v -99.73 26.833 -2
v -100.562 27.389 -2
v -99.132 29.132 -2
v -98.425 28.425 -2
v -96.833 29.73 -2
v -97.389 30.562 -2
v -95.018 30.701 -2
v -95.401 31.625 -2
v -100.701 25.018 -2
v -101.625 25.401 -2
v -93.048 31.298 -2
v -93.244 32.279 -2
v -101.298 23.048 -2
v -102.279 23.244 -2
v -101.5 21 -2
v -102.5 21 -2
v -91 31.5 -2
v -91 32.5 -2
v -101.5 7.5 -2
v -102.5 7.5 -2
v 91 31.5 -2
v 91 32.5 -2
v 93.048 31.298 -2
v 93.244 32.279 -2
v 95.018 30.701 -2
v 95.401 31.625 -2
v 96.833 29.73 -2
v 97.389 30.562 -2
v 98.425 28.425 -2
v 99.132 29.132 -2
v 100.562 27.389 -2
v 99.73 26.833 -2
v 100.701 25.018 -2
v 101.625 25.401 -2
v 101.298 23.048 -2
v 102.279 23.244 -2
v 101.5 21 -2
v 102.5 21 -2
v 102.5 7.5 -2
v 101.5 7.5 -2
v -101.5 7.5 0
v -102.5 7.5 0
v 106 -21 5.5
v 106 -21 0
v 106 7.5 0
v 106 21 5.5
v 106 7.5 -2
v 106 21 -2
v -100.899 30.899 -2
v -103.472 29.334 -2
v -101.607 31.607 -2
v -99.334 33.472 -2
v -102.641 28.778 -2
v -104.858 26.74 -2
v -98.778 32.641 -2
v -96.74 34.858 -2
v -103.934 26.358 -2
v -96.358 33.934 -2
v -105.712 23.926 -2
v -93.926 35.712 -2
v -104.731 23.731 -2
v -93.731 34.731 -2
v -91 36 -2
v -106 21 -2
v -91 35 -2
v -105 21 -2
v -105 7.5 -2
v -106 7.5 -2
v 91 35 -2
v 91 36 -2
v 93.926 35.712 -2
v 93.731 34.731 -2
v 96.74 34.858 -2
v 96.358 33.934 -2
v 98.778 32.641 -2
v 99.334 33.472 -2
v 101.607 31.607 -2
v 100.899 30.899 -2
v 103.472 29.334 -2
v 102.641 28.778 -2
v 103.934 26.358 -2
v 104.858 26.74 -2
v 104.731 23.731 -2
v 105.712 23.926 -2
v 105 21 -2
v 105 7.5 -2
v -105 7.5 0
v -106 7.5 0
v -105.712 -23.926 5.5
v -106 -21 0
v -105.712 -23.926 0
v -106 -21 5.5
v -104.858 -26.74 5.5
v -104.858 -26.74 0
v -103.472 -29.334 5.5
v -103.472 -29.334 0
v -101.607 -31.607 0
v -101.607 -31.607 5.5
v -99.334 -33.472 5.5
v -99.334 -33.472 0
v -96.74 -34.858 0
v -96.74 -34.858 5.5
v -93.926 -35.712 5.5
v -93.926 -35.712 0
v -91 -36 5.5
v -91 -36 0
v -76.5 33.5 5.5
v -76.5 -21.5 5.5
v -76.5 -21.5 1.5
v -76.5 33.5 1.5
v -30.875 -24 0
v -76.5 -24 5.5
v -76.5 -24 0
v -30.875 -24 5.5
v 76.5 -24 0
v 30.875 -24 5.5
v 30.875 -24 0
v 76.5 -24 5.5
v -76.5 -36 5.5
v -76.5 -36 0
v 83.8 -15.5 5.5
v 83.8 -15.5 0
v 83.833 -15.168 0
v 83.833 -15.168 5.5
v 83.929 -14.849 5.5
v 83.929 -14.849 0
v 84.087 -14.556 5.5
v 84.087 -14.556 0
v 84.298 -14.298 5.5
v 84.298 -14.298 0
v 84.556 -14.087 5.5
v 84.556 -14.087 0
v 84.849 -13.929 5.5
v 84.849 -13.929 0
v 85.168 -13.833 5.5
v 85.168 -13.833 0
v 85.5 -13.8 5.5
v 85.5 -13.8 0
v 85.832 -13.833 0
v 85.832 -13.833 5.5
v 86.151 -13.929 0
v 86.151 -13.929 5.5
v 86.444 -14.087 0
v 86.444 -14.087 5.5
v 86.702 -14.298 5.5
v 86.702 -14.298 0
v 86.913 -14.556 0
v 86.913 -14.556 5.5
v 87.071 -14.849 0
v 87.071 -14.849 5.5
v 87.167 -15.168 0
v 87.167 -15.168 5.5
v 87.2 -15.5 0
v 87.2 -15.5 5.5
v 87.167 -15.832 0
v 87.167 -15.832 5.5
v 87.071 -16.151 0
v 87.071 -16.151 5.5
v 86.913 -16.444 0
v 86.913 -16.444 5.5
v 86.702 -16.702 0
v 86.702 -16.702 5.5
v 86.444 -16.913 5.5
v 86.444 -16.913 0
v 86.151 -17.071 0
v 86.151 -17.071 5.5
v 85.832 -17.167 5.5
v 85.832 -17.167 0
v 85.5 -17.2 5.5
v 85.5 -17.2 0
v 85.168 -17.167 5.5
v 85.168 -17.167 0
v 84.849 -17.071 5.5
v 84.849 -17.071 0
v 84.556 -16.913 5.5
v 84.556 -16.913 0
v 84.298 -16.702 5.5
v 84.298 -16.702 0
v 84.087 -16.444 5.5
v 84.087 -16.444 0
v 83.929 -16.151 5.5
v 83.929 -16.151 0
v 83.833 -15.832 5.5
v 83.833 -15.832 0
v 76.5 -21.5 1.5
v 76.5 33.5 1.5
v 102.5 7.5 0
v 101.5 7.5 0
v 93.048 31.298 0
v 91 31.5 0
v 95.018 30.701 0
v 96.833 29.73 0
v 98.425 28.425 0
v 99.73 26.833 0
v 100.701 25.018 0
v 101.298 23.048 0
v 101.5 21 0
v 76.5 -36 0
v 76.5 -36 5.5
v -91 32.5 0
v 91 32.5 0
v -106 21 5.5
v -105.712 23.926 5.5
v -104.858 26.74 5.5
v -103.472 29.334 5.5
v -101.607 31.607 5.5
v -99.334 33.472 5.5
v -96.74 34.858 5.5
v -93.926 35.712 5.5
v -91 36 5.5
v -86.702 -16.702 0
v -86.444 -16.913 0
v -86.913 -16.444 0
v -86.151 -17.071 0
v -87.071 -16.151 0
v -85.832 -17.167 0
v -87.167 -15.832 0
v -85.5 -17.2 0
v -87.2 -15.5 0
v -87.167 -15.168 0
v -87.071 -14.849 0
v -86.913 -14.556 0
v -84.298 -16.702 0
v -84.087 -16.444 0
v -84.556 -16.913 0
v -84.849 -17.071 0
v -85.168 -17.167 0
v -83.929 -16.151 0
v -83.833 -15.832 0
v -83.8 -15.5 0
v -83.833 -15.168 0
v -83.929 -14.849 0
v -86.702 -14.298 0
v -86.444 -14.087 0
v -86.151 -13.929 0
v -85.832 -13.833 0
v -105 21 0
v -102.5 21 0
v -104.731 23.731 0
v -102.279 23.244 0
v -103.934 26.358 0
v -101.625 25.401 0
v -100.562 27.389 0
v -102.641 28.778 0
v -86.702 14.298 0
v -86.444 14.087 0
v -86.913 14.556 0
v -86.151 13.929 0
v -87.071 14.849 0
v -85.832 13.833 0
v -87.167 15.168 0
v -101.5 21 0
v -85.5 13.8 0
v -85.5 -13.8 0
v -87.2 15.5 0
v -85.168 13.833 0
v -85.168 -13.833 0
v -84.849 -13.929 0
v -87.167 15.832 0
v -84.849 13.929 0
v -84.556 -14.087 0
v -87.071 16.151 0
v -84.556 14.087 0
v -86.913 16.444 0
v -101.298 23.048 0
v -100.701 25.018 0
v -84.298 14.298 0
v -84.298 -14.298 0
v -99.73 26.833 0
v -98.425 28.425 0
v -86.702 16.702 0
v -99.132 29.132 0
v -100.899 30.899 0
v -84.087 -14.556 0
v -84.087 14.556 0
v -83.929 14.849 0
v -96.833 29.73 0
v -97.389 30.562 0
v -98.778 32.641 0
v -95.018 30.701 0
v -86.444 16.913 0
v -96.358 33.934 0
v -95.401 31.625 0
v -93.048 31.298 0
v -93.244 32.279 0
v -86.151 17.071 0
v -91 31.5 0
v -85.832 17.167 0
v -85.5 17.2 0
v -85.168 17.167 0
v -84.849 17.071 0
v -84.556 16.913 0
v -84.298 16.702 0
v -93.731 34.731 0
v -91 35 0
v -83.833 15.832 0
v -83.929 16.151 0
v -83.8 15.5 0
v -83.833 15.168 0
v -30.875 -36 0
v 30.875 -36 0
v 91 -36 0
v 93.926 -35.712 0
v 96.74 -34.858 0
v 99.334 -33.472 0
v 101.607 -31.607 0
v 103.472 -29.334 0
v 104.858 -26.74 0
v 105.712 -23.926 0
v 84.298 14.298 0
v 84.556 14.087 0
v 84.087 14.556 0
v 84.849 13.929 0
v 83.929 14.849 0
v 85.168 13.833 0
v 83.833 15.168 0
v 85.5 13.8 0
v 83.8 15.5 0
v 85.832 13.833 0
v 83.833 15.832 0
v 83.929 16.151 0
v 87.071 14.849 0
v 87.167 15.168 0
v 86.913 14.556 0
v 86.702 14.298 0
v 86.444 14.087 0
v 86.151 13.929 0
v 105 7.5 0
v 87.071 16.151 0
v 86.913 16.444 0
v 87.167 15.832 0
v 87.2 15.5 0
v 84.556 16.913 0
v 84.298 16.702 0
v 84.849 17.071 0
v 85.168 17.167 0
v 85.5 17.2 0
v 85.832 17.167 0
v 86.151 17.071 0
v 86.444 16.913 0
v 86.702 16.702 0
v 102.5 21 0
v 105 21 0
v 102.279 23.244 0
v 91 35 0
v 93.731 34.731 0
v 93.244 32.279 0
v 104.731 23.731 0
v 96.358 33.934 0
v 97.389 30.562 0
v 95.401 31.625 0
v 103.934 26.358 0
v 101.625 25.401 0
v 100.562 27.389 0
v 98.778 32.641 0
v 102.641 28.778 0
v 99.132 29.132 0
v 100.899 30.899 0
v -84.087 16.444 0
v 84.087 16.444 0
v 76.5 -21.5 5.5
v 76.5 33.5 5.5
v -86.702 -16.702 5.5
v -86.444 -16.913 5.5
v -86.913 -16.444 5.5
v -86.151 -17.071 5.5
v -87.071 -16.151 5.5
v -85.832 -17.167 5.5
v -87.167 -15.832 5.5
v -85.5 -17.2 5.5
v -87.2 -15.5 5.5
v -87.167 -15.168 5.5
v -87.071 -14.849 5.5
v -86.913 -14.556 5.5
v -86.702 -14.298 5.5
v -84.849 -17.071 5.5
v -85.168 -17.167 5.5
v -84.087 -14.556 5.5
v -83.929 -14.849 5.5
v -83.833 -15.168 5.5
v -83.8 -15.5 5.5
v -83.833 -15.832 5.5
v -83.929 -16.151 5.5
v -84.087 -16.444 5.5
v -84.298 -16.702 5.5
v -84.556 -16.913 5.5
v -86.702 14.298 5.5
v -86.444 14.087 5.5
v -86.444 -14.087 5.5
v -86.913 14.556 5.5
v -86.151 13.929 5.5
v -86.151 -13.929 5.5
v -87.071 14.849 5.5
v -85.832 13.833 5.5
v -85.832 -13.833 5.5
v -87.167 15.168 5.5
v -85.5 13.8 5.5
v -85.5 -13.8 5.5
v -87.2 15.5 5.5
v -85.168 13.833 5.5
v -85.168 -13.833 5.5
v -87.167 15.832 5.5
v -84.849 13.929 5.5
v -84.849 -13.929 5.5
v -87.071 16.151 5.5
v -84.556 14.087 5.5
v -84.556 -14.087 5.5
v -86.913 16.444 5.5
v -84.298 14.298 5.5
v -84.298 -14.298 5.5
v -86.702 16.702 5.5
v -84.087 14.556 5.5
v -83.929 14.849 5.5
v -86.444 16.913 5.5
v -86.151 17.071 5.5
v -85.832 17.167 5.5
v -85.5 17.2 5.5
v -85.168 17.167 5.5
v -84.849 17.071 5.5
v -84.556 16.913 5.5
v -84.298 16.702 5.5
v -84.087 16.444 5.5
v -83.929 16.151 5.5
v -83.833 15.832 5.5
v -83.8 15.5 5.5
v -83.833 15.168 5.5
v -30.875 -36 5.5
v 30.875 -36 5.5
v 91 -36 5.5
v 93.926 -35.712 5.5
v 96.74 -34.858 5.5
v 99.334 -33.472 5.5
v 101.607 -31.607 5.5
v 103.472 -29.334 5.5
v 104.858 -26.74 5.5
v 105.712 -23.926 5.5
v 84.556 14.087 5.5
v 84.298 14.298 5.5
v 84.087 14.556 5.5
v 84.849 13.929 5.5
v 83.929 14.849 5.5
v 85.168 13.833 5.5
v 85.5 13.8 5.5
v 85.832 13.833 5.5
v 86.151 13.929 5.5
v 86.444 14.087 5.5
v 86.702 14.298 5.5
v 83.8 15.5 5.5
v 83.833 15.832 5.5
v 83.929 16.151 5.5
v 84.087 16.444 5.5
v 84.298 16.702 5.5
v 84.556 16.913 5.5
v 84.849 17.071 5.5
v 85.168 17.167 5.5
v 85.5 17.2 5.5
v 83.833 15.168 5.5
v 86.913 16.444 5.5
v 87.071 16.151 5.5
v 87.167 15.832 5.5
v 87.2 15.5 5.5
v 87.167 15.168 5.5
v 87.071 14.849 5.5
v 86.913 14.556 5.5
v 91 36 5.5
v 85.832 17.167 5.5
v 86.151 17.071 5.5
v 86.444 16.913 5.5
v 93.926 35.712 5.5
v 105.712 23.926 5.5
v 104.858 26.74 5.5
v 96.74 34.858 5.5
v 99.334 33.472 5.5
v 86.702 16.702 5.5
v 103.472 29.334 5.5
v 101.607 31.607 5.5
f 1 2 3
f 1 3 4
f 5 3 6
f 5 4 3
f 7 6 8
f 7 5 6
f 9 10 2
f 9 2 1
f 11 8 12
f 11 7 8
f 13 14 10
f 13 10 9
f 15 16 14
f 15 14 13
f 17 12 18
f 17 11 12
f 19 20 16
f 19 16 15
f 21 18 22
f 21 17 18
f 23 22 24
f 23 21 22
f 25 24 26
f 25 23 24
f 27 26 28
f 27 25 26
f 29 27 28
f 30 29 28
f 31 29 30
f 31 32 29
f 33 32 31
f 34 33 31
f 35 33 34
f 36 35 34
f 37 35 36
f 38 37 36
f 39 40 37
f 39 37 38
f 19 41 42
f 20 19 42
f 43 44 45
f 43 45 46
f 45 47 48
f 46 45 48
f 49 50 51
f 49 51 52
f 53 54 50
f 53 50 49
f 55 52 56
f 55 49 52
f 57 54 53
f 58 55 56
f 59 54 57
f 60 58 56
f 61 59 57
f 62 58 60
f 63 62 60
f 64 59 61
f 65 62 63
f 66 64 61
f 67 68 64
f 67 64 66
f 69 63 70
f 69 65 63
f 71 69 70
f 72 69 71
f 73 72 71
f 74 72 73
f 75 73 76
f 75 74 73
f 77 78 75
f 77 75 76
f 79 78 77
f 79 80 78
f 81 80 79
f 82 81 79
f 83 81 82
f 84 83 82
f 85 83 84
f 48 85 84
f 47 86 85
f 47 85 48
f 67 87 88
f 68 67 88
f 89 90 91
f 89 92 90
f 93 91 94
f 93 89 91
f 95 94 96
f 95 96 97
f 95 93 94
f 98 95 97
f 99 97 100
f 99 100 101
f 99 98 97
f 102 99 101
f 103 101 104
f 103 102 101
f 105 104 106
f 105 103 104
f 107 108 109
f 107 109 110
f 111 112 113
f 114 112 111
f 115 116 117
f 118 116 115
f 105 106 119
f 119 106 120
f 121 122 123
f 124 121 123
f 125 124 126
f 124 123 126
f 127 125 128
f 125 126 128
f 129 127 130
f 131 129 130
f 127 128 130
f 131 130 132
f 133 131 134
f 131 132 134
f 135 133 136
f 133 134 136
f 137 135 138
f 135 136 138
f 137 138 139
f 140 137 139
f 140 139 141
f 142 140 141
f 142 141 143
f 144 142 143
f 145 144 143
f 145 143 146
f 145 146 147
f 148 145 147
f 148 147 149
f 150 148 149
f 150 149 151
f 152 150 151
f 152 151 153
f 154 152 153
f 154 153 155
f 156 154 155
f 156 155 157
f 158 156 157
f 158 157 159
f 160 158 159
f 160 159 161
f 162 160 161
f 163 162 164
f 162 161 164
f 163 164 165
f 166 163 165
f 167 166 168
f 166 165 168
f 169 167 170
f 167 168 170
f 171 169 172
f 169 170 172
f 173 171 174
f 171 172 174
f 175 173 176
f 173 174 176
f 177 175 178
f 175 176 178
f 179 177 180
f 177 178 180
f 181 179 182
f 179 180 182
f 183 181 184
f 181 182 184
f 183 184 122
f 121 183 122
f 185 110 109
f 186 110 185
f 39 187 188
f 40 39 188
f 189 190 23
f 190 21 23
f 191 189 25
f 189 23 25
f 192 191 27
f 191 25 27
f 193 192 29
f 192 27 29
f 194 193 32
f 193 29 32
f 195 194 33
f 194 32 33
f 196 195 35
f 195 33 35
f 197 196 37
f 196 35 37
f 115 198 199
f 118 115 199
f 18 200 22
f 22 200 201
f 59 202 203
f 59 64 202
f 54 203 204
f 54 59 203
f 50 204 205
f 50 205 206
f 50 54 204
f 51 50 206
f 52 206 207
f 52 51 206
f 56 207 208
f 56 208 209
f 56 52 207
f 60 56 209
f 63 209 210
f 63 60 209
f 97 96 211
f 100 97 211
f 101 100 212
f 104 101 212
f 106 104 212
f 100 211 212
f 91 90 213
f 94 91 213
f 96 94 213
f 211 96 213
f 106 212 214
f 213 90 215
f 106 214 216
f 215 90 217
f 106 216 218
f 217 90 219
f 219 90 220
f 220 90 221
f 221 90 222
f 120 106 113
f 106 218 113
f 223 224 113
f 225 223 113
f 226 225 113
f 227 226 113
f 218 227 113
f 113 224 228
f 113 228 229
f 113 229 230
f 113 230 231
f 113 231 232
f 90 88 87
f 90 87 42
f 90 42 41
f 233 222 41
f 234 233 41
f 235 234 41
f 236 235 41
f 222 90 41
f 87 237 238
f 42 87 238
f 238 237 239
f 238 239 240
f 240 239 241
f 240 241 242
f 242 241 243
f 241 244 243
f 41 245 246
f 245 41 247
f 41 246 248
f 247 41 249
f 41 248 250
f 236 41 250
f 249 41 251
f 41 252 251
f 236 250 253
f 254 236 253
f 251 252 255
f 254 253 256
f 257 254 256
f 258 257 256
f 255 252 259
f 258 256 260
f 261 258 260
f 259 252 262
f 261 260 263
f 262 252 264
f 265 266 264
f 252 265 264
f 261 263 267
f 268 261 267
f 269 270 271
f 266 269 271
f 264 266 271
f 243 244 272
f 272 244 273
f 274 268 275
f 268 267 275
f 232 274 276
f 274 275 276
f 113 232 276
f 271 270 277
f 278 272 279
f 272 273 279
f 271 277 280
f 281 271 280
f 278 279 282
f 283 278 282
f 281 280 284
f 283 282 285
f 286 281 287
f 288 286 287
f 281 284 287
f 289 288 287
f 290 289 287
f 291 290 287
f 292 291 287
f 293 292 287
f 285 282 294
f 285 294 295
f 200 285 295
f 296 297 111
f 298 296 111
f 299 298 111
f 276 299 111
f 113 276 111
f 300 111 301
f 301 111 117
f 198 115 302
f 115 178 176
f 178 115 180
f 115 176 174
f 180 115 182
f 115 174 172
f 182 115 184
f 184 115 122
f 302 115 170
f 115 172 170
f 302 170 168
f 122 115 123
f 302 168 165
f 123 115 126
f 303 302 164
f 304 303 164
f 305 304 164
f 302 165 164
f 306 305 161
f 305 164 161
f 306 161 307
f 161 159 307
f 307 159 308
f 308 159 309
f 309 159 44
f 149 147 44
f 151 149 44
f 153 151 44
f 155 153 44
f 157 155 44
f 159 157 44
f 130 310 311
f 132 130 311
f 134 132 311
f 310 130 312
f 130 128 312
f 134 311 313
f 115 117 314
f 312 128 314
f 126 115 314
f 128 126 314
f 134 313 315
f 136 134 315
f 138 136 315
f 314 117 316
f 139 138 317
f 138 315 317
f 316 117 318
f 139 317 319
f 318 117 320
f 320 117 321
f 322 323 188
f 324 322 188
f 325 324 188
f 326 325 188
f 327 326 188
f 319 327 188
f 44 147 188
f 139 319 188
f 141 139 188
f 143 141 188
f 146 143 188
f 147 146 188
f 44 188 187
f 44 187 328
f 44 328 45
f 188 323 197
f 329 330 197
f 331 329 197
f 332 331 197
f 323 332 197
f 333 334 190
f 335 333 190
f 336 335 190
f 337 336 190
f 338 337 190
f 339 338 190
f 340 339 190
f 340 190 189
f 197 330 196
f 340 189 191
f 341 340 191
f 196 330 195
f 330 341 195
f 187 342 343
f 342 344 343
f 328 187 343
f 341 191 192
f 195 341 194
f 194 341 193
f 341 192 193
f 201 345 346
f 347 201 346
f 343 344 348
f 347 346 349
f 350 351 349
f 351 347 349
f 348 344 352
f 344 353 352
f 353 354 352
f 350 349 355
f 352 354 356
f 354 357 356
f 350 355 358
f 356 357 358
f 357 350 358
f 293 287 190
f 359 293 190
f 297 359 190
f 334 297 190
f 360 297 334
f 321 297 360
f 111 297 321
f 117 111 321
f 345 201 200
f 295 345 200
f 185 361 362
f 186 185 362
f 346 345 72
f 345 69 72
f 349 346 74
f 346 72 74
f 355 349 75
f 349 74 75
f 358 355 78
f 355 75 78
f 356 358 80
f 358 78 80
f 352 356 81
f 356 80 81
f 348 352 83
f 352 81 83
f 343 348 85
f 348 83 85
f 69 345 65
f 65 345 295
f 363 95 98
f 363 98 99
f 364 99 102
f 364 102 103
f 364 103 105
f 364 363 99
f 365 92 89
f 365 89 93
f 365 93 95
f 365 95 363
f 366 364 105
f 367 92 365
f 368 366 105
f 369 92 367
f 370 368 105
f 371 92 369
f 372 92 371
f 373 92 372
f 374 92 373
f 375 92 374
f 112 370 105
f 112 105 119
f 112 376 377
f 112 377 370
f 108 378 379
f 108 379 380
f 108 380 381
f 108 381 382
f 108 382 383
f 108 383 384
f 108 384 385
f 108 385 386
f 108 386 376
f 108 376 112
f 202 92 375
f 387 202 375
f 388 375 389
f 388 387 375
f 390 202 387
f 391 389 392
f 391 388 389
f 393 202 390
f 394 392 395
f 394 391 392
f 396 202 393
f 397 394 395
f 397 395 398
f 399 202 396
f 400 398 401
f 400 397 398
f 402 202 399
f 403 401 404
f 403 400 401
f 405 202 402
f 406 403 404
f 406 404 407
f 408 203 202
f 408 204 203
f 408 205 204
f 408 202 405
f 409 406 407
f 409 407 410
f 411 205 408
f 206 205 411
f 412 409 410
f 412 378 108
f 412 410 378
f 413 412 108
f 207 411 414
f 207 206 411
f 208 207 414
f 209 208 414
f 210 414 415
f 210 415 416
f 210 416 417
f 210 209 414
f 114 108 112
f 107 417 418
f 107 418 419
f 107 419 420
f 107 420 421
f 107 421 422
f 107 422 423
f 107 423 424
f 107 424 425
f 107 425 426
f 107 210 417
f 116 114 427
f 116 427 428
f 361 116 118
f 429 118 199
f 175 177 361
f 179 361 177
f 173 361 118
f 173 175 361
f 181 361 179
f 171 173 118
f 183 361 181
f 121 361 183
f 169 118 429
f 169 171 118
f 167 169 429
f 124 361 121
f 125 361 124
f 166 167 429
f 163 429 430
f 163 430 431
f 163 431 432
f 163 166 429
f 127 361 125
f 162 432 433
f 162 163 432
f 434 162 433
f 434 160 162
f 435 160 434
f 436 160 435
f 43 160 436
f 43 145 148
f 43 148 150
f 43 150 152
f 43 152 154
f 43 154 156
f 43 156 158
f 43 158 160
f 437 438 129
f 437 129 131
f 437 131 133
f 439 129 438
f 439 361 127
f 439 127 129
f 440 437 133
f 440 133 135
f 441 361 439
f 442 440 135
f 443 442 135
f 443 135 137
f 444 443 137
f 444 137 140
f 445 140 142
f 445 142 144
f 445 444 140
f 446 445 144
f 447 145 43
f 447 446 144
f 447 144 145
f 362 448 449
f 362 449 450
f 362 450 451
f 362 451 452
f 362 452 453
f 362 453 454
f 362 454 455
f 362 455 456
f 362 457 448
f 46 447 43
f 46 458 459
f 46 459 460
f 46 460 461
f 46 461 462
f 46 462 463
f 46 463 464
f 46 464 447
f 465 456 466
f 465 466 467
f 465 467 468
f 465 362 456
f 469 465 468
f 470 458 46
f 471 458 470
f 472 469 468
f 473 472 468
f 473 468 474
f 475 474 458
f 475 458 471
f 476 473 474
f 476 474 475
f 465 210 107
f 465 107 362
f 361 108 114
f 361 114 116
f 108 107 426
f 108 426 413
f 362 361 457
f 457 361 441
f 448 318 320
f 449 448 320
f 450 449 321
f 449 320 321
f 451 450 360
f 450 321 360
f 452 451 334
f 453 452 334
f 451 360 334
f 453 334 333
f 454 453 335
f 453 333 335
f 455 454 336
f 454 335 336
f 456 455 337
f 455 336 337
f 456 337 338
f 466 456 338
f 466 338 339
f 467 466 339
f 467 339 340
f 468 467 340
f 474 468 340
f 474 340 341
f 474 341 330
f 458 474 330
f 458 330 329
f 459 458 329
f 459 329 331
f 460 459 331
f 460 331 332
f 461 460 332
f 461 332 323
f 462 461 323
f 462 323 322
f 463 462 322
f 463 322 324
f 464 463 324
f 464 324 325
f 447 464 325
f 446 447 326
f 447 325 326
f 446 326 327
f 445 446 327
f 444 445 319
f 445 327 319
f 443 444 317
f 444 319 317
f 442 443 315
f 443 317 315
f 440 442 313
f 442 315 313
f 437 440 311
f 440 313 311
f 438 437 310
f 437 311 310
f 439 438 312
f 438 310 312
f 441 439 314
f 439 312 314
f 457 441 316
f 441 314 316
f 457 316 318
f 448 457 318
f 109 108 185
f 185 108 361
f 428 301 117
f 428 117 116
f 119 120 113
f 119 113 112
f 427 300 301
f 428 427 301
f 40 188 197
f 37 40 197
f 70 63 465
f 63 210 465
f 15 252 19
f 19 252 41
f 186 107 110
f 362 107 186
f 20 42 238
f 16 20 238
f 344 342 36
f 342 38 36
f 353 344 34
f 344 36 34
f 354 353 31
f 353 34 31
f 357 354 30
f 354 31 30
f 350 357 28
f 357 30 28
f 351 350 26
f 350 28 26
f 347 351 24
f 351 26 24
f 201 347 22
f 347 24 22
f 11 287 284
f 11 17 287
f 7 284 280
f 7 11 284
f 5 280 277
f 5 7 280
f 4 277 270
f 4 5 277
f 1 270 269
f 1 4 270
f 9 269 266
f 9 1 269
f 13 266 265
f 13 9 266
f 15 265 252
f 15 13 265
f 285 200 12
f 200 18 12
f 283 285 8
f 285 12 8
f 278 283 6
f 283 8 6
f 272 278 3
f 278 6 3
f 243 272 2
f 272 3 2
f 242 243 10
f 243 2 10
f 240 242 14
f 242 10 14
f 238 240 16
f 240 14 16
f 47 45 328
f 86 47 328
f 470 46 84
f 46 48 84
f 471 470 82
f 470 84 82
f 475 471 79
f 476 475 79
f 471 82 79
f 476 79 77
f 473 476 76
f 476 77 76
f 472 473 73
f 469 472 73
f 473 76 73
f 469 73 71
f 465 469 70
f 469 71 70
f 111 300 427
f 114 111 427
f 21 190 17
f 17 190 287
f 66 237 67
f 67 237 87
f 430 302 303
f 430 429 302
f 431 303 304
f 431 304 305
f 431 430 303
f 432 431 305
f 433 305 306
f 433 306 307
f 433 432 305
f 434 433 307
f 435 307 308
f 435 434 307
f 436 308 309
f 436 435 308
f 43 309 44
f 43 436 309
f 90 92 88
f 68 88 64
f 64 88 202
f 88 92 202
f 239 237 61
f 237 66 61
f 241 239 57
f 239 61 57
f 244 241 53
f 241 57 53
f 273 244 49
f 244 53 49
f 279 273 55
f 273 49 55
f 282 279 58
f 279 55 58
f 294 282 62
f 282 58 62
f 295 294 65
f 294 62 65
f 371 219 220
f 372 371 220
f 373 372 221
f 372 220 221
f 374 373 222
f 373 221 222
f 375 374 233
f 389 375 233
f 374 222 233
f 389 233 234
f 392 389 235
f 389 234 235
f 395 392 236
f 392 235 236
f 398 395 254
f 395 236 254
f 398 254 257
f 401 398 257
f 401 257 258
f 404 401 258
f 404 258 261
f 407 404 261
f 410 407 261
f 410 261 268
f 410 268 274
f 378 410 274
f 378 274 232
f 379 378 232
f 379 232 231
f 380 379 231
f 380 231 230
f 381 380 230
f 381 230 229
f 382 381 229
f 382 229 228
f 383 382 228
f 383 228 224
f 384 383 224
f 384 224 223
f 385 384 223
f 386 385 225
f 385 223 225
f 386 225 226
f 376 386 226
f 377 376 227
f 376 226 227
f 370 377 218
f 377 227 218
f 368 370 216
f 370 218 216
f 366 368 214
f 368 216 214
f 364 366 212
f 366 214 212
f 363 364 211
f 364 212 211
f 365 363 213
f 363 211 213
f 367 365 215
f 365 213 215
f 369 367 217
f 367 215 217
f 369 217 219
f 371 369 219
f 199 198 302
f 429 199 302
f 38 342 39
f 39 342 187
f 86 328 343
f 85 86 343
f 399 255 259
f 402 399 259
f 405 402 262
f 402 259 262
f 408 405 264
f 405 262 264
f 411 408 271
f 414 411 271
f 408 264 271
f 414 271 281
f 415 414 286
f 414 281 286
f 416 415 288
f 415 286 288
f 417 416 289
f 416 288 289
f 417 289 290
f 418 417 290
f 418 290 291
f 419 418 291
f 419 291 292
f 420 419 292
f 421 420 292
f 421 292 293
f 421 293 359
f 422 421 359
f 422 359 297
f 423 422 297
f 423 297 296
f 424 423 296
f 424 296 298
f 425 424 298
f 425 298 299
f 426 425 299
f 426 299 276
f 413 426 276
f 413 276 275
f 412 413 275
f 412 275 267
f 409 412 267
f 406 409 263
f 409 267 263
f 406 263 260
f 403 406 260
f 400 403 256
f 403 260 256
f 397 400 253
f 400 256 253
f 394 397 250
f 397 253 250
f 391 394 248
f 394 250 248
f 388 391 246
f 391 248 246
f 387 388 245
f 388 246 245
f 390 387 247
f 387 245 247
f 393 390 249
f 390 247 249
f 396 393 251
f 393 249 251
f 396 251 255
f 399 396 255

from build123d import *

# Parameters (mm, degrees)
F0_W      = 212
F0_H      = 72
F1_DEPTH  = 5.5
F2_R      = 15
F3_W      = 45.625
F3_H      = 5.5
F4_DEPTH  = 12
F6_DEPTH  = 2
F7_R      = 10.5
F8_R      = 11.5
F9_R      = 14
F10_R     = 15
F11_W     = 153
F11_H     = 55
F12_DEPTH = 4
F14_D     = 3.4


# Not quite as in the source:
# - a feature names something its author has since deleted; it is built from what else it names


with BuildPart() as f1:
    # F0 (on Top) → F1 (new body)
    with BuildSketch(Plane.XY):
        Rectangle(F0_W, F0_H)
    extrude(amount=F1_DEPTH)

    # F2
    f2_edges = [f1.edges().sort_by_distance(p)[0] for p in [
        (-106, -36, 2.75),
        (106, -36, 2.75),
    ]]
    fillet(f2_edges, radius=F2_R)

    # F3 (on face) → F4 (cut)
    with BuildSketch(Plane.XZ.offset(36)):
        with Locations((-53.6875, 2.75)):
            Rectangle(F3_W, F3_H)
        with Locations((53.6875, 2.75)):
            Rectangle(F3_W, F3_H)
    extrude(amount=-F4_DEPTH, mode=Mode.SUBTRACT)

    # F5 (on face) → F6 (join)
    with BuildSketch(Plane(origin=(0, 0, 0), x_dir=(1, 0, 0), z_dir=(0, 0, -1))):
        Polygon((-105, -7.5), (-106, -7.5), (-106, -36), (106, -36), (106, -7.5), (105, -7.5), (105, -35), (-105, -35), align=None)
        Polygon((101.5, -31.5), (-101.5, -31.5), (-101.5, -7.5), (-102.5, -7.5), (-102.5, -32.5), (102.5, -32.5), (102.5, -7.5), (101.5, -7.5), align=None)
    extrude(amount=F6_DEPTH)

    # F7
    f7_edges = [f1.edges().sort_by_distance(p)[0] for p in [
        (101.5, 31.5, -1),
        (-101.5, 31.5, -1),
    ]]
    fillet(f7_edges, radius=F7_R)

    # F8
    f8_edges = [f1.edges().sort_by_distance(p)[0] for p in [
        (102.5, 32.5, -1),
        (-102.5, 32.5, -1),
    ]]
    fillet(f8_edges, radius=F8_R)

    # F9
    f9_edges = [f1.edges().sort_by_distance(p)[0] for p in [
        (105, 35, -1),
        (-105, 35, -1),
    ]]
    fillet(f9_edges, radius=F9_R)

    # F10
    f10_edges = [f1.edges().sort_by_distance(p)[0] for p in [
        (106, 36, 1.75),
        (-106, 36, 1.75),
    ]]
    fillet(f10_edges, radius=F10_R)

    # F11 (on face) → F12 (cut)
    with BuildSketch(Plane.XY.offset(5.5)):
        with Locations((0, 6)):
            Rectangle(F11_W, F11_H)
    extrude(amount=-F12_DEPTH, mode=Mode.SUBTRACT)

    # F14 (through all)
    with Locations(Plane.XY.offset(5.5)):
        with Locations((-85.5, 15.5), (85.5, 15.5), (85.5, -15.5), (-85.5, -15.5)):
            Hole(F14_D / 2)


solid = f1.part
